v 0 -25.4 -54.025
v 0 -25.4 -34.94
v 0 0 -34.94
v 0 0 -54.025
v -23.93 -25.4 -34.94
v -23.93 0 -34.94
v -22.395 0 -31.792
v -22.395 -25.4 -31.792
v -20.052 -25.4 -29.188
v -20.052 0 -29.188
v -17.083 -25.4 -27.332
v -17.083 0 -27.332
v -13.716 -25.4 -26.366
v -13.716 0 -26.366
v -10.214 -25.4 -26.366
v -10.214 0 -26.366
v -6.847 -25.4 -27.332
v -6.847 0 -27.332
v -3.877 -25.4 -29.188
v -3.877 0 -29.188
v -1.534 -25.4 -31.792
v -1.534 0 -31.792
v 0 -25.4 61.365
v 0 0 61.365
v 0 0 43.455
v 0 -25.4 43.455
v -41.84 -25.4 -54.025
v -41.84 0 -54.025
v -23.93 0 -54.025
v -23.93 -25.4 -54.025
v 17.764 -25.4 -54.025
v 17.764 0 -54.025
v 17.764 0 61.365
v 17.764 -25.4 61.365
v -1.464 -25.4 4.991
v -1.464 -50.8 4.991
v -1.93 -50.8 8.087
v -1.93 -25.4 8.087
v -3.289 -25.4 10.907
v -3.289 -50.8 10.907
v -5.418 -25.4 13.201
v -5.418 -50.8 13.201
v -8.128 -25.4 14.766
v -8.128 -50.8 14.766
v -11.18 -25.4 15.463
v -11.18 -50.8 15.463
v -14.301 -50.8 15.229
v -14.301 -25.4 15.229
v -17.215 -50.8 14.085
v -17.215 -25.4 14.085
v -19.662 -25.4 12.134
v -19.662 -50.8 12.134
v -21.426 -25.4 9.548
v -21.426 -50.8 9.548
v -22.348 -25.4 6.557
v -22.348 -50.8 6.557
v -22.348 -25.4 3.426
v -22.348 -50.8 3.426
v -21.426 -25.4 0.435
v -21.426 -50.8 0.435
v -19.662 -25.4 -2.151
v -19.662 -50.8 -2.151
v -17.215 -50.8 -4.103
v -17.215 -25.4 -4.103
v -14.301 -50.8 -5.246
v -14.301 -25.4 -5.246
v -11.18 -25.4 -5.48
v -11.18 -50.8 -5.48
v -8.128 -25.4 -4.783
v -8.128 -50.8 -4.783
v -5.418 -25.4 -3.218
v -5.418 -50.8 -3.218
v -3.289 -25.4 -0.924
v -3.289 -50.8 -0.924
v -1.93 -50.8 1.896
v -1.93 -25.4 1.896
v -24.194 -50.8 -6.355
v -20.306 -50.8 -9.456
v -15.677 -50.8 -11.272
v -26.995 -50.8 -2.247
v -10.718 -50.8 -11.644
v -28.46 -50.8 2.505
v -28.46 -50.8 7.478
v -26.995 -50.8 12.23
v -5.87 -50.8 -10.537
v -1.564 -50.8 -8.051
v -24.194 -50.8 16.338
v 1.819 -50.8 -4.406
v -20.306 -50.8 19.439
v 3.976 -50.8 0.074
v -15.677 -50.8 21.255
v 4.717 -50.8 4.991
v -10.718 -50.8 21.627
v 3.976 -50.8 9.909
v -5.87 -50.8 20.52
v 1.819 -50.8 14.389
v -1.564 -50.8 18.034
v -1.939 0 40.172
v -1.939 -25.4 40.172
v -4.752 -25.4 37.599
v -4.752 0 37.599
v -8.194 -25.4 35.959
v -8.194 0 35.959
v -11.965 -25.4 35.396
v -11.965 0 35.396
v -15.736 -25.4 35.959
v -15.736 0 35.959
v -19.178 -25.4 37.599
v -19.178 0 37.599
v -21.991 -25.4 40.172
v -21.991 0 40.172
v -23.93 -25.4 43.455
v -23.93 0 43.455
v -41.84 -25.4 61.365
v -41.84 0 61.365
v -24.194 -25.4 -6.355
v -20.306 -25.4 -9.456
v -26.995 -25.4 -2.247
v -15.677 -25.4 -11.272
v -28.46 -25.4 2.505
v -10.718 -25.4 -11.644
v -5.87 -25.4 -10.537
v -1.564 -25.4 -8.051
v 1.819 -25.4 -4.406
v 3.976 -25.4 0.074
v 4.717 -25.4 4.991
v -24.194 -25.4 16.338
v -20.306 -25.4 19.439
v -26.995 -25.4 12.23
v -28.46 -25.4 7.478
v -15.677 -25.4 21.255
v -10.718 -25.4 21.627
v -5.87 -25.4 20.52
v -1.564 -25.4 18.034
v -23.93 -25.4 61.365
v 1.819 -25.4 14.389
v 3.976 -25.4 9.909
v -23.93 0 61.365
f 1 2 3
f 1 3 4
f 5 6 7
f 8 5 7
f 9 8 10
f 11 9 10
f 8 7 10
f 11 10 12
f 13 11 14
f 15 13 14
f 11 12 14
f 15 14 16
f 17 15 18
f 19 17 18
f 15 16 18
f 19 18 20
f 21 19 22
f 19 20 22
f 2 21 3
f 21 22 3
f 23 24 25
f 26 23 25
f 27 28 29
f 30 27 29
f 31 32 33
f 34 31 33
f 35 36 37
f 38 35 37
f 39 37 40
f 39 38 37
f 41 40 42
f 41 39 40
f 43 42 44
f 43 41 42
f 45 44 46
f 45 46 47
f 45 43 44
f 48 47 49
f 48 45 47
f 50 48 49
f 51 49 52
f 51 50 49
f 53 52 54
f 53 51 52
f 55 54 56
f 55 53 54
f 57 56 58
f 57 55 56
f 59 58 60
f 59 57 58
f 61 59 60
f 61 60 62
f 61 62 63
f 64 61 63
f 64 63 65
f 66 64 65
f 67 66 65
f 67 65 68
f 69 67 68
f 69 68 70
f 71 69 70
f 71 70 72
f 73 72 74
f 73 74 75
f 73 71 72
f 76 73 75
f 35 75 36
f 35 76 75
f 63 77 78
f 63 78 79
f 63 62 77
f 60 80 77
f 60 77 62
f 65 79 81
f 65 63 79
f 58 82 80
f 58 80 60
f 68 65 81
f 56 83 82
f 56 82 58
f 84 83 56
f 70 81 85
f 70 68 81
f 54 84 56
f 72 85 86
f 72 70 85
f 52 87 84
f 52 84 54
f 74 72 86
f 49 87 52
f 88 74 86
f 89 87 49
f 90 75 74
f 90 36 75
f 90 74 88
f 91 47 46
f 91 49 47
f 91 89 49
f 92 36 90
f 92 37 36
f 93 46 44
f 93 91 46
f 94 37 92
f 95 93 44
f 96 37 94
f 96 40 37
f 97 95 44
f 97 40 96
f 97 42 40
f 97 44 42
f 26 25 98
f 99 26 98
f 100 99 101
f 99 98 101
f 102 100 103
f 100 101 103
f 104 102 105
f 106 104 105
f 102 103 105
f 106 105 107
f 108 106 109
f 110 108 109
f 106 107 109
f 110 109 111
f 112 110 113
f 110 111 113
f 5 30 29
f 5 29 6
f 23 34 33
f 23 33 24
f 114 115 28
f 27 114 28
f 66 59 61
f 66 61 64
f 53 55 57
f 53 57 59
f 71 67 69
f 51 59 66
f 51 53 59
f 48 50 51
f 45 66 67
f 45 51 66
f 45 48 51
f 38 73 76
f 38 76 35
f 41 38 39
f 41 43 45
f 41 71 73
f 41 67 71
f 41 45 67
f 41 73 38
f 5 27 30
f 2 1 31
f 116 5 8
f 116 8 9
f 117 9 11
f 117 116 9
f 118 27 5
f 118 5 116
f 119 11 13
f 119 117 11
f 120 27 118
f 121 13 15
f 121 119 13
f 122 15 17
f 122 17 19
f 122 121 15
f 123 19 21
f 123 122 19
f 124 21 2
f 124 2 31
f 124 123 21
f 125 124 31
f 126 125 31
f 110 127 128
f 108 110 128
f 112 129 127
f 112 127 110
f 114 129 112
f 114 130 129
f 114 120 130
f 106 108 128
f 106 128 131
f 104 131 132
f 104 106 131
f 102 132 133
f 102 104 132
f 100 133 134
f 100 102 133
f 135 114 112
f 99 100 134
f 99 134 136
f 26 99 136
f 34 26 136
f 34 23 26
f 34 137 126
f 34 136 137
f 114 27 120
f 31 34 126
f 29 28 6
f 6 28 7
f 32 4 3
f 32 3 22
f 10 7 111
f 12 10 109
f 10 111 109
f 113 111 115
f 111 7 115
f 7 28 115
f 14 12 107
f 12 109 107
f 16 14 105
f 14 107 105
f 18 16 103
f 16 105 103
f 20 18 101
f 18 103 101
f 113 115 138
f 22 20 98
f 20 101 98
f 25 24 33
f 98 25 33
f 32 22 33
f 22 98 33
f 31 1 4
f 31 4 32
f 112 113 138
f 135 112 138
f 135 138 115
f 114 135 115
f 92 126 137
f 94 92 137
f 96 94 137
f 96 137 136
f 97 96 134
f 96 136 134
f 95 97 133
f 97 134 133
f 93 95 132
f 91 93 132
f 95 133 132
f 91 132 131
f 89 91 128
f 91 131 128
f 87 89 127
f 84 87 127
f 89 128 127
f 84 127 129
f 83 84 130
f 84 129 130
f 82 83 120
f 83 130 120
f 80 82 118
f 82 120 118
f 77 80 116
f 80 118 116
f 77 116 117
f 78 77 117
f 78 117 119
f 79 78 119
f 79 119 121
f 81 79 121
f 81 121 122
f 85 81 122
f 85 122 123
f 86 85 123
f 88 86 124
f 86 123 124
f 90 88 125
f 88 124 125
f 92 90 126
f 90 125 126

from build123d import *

# Parameters (mm, degrees)
F1_DEPTH = 25.4
F2_R     = 16.682026
F2_R_2   = 10.500829
F3_DEPTH = 25.4


with BuildPart() as f1:
    # F0 (on Front) → F1 (new body)
    with BuildSketch(Plane.XZ):
        with BuildLine():
            Line((-23.929596, 61.36547), (-41.840091, 61.36547))
            Line((-41.840091, 61.36547), (-41.840091, -54.025102))
            Line((-41.840091, -54.025102), (-23.929596, -54.025102))
            Line((-23.929596, -54.025102), (-23.929596, -34.940146))
            ThreePointArc((-23.929596, -34.940146), (-11.964798, -26.243898), (0, -34.940146))
            Line((0, -34.940146), (0, -54.025102))
            Line((0, -54.025102), (17.763687, -54.025102))
            Line((17.763687, -54.025102), (17.763687, 61.36547))
            Line((17.763687, 61.36547), (0, 61.36547))
            Line((0, 61.36547), (0, 43.454971))
            ThreePointArc((0, 43.454971), (-11.964798, 35.3963), (-23.929596, 43.454971))
            Line((-23.929596, 43.454971), (-23.929596, 61.36547))
        make_face()
    extrude(amount=F1_DEPTH)

    # F2 (on face) → F3 (join)
    with BuildSketch(Plane.XZ.offset(25.4)):
        with Locations((-11.964798, 4.991449)):
            Circle(F2_R)
        with Locations((-11.964798, 4.991449)):
            Circle(F2_R_2, mode=Mode.SUBTRACT)
    extrude(amount=F3_DEPTH)


solid = f1.part
